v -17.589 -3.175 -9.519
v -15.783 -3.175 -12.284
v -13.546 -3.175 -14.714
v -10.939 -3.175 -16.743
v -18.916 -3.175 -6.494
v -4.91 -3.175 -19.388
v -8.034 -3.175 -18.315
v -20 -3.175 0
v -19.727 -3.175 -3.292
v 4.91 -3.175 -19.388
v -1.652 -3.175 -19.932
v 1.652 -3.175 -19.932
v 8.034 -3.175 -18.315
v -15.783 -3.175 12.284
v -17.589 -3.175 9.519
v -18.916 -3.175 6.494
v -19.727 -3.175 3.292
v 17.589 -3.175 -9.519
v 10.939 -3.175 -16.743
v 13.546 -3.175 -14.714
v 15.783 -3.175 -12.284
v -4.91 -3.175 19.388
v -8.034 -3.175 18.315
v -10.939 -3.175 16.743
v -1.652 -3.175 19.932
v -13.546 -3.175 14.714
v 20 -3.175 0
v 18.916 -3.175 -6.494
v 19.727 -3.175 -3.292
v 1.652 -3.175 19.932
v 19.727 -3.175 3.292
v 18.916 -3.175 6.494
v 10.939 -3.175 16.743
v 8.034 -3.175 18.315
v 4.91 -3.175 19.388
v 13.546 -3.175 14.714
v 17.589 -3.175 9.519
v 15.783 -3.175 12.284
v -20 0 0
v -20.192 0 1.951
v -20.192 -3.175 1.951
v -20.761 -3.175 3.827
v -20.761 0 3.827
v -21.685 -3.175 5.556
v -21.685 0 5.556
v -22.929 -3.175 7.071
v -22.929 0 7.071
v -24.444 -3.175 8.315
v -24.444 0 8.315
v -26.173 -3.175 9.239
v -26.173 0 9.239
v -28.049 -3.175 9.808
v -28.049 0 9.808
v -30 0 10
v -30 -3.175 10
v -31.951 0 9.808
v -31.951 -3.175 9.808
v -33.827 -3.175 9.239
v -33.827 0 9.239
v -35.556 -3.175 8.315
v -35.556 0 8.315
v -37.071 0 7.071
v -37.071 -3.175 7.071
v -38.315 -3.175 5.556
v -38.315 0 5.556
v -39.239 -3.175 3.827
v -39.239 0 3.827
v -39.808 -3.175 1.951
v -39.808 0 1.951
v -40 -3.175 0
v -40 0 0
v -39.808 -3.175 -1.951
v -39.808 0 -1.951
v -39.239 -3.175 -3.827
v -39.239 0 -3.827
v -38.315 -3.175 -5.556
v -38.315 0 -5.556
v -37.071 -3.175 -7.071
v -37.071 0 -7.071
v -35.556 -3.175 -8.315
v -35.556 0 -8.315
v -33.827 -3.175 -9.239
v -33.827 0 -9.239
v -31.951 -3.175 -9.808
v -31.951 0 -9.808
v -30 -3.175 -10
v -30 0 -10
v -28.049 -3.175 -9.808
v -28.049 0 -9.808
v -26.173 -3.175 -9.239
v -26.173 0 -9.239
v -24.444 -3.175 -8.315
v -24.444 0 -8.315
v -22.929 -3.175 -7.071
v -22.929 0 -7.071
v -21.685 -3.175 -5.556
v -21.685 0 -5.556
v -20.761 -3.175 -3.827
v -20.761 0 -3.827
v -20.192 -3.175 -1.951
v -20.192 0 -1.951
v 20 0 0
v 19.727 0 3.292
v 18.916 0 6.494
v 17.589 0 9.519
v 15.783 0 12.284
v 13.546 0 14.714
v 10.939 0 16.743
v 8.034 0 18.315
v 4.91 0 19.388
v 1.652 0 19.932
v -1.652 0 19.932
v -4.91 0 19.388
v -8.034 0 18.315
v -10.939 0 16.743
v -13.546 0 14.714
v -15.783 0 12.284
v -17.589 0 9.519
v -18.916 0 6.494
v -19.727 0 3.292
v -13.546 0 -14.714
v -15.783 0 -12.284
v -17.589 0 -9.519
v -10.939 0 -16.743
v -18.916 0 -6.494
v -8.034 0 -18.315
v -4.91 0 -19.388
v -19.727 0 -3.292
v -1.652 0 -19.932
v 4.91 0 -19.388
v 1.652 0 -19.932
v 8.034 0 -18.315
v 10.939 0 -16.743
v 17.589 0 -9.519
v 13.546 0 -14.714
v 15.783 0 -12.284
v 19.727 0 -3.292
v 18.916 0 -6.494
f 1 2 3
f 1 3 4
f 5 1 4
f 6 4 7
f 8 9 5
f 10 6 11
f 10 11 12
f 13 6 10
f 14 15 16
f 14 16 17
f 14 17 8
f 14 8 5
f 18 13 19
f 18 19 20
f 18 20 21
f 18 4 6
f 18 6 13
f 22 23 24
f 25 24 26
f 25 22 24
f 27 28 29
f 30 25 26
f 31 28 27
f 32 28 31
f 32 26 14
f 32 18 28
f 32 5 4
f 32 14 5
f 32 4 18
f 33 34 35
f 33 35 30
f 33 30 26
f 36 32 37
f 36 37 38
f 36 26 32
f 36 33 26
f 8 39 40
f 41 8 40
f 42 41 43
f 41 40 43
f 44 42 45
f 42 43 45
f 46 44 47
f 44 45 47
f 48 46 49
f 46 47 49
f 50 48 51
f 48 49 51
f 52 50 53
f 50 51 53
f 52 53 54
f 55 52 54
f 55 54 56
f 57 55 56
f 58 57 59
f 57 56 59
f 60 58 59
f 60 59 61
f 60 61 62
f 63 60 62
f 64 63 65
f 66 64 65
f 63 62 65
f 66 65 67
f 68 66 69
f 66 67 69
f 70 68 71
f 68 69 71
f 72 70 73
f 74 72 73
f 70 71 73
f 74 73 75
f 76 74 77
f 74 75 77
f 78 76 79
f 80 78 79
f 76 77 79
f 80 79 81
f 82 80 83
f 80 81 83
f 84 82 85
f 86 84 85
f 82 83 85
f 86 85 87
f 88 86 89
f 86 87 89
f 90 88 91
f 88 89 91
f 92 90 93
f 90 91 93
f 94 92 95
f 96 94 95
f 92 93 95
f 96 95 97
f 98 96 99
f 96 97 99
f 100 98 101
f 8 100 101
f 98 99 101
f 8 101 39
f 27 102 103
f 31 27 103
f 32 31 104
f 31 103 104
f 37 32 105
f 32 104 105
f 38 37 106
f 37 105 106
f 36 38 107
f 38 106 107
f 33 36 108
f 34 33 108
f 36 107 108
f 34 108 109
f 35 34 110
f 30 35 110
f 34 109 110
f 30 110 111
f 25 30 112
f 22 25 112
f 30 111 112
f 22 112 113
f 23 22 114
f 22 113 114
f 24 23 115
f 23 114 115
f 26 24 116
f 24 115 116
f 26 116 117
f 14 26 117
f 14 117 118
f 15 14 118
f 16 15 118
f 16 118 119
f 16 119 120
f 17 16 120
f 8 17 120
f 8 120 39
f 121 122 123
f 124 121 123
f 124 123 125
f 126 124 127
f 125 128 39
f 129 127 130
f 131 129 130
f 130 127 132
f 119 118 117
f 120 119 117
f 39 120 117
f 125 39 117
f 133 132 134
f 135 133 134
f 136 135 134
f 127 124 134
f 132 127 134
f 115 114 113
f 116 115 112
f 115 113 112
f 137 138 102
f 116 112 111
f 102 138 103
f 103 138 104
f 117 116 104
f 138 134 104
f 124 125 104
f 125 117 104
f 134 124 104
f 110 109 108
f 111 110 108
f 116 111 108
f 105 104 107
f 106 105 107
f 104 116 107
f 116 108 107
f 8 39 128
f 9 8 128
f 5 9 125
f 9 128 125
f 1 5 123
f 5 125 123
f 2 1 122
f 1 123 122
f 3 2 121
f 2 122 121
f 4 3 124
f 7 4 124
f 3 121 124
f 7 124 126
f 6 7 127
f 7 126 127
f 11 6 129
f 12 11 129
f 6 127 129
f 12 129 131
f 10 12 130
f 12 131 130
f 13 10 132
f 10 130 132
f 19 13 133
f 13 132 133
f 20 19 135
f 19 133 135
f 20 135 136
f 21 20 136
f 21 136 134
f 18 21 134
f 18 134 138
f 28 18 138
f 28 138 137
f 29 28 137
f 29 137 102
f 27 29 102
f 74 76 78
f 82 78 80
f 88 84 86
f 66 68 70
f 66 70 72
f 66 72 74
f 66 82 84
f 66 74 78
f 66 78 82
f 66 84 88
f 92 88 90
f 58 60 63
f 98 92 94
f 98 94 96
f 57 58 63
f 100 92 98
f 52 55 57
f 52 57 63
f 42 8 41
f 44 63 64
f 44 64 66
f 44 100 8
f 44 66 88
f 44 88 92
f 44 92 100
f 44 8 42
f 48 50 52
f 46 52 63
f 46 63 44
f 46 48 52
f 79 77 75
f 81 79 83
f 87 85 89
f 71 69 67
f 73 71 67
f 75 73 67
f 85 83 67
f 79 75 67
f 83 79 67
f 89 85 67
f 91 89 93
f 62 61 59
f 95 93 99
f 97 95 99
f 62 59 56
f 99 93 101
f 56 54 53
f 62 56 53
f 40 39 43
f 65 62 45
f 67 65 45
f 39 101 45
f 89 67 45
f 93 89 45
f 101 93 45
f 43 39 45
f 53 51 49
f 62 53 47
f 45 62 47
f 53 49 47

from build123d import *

# Parameters (mm, degrees)
F0_R     = 20
F1_R     = 10
F2_DEPTH = 3.175


with BuildPart() as f2:
    # F0 (on Front) + F1 (on Front) → F2 (new body)
    with BuildSketch(Plane.XZ):
        Circle(F0_R)
    with BuildSketch(Plane.XZ):
        with Locations((-30, 0)):
            Circle(F1_R)
    extrude(amount=F2_DEPTH)


solid = f2.part
